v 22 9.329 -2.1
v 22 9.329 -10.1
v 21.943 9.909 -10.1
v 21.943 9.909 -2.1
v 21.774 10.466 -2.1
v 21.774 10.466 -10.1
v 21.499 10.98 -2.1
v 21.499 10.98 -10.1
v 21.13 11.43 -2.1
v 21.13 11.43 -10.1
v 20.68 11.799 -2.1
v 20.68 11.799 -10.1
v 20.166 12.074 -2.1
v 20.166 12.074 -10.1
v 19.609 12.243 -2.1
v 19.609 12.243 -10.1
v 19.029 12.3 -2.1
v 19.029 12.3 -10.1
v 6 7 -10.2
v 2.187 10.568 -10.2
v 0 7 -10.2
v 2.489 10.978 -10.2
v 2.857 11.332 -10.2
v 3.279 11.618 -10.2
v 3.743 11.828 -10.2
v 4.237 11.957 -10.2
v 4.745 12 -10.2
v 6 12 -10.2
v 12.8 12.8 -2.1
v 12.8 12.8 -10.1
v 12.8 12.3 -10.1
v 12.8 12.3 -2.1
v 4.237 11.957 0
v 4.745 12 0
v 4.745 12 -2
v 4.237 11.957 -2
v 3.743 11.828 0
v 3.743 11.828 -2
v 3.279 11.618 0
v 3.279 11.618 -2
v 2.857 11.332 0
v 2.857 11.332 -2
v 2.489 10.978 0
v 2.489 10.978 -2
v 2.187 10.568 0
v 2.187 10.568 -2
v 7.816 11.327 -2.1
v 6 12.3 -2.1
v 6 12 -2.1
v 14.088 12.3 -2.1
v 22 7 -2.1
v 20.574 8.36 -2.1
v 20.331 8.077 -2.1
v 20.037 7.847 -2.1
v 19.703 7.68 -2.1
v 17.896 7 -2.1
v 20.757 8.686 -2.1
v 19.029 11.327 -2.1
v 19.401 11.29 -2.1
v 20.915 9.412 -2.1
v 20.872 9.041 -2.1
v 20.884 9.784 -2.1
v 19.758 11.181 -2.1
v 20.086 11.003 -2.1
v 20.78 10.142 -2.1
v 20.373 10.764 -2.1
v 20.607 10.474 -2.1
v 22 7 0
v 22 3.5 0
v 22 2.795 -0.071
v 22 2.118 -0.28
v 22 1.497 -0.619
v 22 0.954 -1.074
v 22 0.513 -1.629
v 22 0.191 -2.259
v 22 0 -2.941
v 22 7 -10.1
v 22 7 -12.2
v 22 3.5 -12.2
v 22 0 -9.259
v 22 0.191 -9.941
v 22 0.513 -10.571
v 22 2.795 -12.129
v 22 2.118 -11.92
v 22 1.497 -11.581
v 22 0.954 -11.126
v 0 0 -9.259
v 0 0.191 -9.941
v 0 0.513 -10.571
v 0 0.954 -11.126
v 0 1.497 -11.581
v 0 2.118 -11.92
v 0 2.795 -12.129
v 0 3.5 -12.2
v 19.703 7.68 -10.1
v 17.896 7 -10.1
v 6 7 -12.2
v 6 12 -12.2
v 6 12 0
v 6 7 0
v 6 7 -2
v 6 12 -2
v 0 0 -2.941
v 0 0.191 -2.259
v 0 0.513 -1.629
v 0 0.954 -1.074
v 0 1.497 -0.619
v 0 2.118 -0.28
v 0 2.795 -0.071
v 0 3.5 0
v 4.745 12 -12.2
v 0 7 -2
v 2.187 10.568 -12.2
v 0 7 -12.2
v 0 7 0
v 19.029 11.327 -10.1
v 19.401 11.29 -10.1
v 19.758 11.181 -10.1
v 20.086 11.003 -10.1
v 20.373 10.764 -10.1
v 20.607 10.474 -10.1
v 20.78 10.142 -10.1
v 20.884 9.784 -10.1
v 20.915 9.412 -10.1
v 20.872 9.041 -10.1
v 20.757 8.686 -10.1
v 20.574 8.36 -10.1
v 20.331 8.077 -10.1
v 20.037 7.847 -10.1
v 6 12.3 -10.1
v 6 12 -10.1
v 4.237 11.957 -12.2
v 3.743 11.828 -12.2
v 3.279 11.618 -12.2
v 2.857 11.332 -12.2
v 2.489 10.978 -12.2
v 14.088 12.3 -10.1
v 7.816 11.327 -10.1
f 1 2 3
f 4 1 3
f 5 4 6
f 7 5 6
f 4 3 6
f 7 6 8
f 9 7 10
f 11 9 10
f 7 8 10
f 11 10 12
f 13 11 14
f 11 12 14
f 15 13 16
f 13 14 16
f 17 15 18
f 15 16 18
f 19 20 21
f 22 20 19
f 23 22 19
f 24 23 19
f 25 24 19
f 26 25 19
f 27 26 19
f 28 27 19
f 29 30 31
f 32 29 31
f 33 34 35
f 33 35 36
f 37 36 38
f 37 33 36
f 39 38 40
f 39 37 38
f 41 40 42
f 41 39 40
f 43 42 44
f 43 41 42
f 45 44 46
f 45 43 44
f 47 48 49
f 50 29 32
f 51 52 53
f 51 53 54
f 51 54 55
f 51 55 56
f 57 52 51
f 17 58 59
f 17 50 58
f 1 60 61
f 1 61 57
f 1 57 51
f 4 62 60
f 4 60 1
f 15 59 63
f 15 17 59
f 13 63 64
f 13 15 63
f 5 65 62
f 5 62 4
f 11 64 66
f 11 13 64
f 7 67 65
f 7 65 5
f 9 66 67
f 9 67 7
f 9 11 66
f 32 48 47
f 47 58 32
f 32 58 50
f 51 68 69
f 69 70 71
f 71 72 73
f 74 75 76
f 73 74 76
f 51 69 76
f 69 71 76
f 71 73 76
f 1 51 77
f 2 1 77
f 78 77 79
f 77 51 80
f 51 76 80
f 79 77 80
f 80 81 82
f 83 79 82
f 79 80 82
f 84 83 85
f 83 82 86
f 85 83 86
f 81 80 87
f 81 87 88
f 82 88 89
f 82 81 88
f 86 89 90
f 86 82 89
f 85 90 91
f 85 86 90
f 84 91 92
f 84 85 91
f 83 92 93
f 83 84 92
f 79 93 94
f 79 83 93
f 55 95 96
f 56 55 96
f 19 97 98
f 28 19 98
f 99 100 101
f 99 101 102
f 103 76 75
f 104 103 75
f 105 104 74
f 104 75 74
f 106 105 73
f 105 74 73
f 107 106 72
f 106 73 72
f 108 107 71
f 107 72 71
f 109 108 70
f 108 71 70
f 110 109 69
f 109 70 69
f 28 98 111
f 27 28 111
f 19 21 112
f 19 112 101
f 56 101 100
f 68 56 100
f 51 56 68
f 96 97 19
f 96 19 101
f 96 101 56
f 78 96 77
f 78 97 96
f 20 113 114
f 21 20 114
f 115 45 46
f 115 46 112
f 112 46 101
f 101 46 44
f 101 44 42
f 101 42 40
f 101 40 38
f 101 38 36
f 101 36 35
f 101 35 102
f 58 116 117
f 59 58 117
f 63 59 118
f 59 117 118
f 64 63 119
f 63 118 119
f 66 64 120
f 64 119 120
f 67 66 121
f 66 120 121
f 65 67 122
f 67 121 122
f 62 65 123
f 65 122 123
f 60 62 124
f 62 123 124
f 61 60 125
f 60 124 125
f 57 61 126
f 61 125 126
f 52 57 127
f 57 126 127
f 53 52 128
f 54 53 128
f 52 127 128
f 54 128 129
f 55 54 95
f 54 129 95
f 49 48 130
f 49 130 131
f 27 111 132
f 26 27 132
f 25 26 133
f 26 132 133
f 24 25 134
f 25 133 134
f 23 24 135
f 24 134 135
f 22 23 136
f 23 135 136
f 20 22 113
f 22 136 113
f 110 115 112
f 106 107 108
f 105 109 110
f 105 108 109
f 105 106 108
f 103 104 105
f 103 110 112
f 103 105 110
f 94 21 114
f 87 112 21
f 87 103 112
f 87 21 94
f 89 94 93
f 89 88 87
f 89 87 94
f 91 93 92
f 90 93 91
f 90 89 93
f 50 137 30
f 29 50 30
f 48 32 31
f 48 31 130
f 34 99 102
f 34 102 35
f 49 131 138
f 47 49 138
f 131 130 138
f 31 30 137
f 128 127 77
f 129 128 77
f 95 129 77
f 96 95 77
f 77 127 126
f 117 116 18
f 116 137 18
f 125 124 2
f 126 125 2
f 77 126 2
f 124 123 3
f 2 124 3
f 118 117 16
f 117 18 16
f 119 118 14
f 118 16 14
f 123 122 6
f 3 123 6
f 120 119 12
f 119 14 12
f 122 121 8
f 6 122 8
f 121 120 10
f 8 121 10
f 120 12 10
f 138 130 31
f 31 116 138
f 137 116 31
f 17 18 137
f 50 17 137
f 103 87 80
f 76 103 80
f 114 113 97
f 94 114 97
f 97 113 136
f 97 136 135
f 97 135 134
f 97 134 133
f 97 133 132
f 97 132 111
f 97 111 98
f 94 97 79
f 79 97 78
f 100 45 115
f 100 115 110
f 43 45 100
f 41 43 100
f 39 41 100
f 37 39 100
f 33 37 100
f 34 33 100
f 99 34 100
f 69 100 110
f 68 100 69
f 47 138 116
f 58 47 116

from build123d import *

# Parameters (mm, degrees)
SKETCH1_W                = 22
SKETCH1_H                = 12.2
BOSS_EXTRUDE1_DEPTH      = 7
CUT_EXTRUDE2_REACH       = 28.112
BOSS_EXTRUDE2_DEPTH      = 2
BOSS_EXTRUDE3_DEPTH      = 4
BOSS_EXTRUDE3_DEPTH_BACK = 4


with BuildPart() as part:
    # Sketch1 → Boss-Extrude1 (new body)
    with BuildSketch(Plane(origin=(0, 0, 0), x_dir=(1, 0, 0), z_dir=(0, 1, 0))):
        with Locations((11, 6.1)):
            Rectangle(SKETCH1_W, SKETCH1_H)
    extrude(amount=BOSS_EXTRUDE1_DEPTH)

    # Sketch2 → Cut-Extrude2 (cut, up to next)
    with BuildSketch(Plane(origin=(22, 0, 0), x_dir=(0, 0, -1), z_dir=(1, 0, 0)), mode=Mode.PRIVATE) as cut_extrude2_sk1:
        with BuildLine():
            Line((0, 3.5), (0, 0))
            Line((0, 0), (2.94128103, 0))
            ThreePointArc((2.94128103, 0), (0.832956575, 1.214112093), (0, 3.5))
        make_face()
    cut_extrude2_tool1 = extrude(cut_extrude2_sk1.sketch, amount=-CUT_EXTRUDE2_REACH, mode=Mode.PRIVATE) & part.part
    cut_extrude2 = cut_extrude2_tool1.solids().sort_by_distance((22, 0.790971, -0.742315))[0]
    add(cut_extrude2, mode=Mode.SUBTRACT)

    # Sketch3 → Boss-Extrude2 (add)
    with BuildSketch(Plane(origin=(0, 0, -12.2), x_dir=(-1, 0, 0), z_dir=(0, 0, -1))):
        with BuildLine():
            Line((0, 7), (-6, 7))
            Line((-6, 7), (-6, 12))
            Line((-6, 12), (-4.74458619, 12))
            ThreePointArc((-4.74458619, 12), (-3.278856211, 11.617562918), (-2.186825896, 10.567757085))
            Line((-2.186825896, 10.567757085), (0, 7))
        make_face()
    boss_extrude2 = extrude(amount=-BOSS_EXTRUDE2_DEPTH)

    # Mirror1: Cut-Extrude2, Boss-Extrude2 across plane
    add(cut_extrude2.mirror(Plane.XY.offset(-6.1)), mode=Mode.SUBTRACT)
    add(boss_extrude2.mirror(Plane.XY.offset(-6.1)))

    # Sketch4 → Boss-Extrude3 (add, two sides: drawn at the far end of the back side and taken through both)
    with BuildSketch(Plane.XY.offset(-6.1).offset(-BOSS_EXTRUDE3_DEPTH_BACK)):
        with BuildLine():
            Line((17.895721593, 7), (22, 7))
            Line((22, 7), (22, 9.329014645))
            ThreePointArc((22, 9.329014645), (21.129818536, 11.429818536), (19.029014645, 12.3))
            Line((19.029014645, 12.3), (14.087770897, 12.3))
            Line((14.087770897, 12.3), (12.8, 12.8))
            Line((12.8, 12.8), (12.8, 12.3))
            Line((12.8, 12.3), (6, 12.3))
            Line((6, 12.3), (6, 12))
            Line((6, 12), (7.815685998, 11.327241441))
            Line((7.815685998, 11.327241441), (19.029014645, 11.327241441))
            ThreePointArc((19.029014645, 11.327241441), (20.883632789, 9.783815259), (19.702745838, 7.679705271))
            Line((19.702745838, 7.679705271), (17.895721593, 7))
        make_face()
    extrude(amount=BOSS_EXTRUDE3_DEPTH + BOSS_EXTRUDE3_DEPTH_BACK)


solid = part.part
